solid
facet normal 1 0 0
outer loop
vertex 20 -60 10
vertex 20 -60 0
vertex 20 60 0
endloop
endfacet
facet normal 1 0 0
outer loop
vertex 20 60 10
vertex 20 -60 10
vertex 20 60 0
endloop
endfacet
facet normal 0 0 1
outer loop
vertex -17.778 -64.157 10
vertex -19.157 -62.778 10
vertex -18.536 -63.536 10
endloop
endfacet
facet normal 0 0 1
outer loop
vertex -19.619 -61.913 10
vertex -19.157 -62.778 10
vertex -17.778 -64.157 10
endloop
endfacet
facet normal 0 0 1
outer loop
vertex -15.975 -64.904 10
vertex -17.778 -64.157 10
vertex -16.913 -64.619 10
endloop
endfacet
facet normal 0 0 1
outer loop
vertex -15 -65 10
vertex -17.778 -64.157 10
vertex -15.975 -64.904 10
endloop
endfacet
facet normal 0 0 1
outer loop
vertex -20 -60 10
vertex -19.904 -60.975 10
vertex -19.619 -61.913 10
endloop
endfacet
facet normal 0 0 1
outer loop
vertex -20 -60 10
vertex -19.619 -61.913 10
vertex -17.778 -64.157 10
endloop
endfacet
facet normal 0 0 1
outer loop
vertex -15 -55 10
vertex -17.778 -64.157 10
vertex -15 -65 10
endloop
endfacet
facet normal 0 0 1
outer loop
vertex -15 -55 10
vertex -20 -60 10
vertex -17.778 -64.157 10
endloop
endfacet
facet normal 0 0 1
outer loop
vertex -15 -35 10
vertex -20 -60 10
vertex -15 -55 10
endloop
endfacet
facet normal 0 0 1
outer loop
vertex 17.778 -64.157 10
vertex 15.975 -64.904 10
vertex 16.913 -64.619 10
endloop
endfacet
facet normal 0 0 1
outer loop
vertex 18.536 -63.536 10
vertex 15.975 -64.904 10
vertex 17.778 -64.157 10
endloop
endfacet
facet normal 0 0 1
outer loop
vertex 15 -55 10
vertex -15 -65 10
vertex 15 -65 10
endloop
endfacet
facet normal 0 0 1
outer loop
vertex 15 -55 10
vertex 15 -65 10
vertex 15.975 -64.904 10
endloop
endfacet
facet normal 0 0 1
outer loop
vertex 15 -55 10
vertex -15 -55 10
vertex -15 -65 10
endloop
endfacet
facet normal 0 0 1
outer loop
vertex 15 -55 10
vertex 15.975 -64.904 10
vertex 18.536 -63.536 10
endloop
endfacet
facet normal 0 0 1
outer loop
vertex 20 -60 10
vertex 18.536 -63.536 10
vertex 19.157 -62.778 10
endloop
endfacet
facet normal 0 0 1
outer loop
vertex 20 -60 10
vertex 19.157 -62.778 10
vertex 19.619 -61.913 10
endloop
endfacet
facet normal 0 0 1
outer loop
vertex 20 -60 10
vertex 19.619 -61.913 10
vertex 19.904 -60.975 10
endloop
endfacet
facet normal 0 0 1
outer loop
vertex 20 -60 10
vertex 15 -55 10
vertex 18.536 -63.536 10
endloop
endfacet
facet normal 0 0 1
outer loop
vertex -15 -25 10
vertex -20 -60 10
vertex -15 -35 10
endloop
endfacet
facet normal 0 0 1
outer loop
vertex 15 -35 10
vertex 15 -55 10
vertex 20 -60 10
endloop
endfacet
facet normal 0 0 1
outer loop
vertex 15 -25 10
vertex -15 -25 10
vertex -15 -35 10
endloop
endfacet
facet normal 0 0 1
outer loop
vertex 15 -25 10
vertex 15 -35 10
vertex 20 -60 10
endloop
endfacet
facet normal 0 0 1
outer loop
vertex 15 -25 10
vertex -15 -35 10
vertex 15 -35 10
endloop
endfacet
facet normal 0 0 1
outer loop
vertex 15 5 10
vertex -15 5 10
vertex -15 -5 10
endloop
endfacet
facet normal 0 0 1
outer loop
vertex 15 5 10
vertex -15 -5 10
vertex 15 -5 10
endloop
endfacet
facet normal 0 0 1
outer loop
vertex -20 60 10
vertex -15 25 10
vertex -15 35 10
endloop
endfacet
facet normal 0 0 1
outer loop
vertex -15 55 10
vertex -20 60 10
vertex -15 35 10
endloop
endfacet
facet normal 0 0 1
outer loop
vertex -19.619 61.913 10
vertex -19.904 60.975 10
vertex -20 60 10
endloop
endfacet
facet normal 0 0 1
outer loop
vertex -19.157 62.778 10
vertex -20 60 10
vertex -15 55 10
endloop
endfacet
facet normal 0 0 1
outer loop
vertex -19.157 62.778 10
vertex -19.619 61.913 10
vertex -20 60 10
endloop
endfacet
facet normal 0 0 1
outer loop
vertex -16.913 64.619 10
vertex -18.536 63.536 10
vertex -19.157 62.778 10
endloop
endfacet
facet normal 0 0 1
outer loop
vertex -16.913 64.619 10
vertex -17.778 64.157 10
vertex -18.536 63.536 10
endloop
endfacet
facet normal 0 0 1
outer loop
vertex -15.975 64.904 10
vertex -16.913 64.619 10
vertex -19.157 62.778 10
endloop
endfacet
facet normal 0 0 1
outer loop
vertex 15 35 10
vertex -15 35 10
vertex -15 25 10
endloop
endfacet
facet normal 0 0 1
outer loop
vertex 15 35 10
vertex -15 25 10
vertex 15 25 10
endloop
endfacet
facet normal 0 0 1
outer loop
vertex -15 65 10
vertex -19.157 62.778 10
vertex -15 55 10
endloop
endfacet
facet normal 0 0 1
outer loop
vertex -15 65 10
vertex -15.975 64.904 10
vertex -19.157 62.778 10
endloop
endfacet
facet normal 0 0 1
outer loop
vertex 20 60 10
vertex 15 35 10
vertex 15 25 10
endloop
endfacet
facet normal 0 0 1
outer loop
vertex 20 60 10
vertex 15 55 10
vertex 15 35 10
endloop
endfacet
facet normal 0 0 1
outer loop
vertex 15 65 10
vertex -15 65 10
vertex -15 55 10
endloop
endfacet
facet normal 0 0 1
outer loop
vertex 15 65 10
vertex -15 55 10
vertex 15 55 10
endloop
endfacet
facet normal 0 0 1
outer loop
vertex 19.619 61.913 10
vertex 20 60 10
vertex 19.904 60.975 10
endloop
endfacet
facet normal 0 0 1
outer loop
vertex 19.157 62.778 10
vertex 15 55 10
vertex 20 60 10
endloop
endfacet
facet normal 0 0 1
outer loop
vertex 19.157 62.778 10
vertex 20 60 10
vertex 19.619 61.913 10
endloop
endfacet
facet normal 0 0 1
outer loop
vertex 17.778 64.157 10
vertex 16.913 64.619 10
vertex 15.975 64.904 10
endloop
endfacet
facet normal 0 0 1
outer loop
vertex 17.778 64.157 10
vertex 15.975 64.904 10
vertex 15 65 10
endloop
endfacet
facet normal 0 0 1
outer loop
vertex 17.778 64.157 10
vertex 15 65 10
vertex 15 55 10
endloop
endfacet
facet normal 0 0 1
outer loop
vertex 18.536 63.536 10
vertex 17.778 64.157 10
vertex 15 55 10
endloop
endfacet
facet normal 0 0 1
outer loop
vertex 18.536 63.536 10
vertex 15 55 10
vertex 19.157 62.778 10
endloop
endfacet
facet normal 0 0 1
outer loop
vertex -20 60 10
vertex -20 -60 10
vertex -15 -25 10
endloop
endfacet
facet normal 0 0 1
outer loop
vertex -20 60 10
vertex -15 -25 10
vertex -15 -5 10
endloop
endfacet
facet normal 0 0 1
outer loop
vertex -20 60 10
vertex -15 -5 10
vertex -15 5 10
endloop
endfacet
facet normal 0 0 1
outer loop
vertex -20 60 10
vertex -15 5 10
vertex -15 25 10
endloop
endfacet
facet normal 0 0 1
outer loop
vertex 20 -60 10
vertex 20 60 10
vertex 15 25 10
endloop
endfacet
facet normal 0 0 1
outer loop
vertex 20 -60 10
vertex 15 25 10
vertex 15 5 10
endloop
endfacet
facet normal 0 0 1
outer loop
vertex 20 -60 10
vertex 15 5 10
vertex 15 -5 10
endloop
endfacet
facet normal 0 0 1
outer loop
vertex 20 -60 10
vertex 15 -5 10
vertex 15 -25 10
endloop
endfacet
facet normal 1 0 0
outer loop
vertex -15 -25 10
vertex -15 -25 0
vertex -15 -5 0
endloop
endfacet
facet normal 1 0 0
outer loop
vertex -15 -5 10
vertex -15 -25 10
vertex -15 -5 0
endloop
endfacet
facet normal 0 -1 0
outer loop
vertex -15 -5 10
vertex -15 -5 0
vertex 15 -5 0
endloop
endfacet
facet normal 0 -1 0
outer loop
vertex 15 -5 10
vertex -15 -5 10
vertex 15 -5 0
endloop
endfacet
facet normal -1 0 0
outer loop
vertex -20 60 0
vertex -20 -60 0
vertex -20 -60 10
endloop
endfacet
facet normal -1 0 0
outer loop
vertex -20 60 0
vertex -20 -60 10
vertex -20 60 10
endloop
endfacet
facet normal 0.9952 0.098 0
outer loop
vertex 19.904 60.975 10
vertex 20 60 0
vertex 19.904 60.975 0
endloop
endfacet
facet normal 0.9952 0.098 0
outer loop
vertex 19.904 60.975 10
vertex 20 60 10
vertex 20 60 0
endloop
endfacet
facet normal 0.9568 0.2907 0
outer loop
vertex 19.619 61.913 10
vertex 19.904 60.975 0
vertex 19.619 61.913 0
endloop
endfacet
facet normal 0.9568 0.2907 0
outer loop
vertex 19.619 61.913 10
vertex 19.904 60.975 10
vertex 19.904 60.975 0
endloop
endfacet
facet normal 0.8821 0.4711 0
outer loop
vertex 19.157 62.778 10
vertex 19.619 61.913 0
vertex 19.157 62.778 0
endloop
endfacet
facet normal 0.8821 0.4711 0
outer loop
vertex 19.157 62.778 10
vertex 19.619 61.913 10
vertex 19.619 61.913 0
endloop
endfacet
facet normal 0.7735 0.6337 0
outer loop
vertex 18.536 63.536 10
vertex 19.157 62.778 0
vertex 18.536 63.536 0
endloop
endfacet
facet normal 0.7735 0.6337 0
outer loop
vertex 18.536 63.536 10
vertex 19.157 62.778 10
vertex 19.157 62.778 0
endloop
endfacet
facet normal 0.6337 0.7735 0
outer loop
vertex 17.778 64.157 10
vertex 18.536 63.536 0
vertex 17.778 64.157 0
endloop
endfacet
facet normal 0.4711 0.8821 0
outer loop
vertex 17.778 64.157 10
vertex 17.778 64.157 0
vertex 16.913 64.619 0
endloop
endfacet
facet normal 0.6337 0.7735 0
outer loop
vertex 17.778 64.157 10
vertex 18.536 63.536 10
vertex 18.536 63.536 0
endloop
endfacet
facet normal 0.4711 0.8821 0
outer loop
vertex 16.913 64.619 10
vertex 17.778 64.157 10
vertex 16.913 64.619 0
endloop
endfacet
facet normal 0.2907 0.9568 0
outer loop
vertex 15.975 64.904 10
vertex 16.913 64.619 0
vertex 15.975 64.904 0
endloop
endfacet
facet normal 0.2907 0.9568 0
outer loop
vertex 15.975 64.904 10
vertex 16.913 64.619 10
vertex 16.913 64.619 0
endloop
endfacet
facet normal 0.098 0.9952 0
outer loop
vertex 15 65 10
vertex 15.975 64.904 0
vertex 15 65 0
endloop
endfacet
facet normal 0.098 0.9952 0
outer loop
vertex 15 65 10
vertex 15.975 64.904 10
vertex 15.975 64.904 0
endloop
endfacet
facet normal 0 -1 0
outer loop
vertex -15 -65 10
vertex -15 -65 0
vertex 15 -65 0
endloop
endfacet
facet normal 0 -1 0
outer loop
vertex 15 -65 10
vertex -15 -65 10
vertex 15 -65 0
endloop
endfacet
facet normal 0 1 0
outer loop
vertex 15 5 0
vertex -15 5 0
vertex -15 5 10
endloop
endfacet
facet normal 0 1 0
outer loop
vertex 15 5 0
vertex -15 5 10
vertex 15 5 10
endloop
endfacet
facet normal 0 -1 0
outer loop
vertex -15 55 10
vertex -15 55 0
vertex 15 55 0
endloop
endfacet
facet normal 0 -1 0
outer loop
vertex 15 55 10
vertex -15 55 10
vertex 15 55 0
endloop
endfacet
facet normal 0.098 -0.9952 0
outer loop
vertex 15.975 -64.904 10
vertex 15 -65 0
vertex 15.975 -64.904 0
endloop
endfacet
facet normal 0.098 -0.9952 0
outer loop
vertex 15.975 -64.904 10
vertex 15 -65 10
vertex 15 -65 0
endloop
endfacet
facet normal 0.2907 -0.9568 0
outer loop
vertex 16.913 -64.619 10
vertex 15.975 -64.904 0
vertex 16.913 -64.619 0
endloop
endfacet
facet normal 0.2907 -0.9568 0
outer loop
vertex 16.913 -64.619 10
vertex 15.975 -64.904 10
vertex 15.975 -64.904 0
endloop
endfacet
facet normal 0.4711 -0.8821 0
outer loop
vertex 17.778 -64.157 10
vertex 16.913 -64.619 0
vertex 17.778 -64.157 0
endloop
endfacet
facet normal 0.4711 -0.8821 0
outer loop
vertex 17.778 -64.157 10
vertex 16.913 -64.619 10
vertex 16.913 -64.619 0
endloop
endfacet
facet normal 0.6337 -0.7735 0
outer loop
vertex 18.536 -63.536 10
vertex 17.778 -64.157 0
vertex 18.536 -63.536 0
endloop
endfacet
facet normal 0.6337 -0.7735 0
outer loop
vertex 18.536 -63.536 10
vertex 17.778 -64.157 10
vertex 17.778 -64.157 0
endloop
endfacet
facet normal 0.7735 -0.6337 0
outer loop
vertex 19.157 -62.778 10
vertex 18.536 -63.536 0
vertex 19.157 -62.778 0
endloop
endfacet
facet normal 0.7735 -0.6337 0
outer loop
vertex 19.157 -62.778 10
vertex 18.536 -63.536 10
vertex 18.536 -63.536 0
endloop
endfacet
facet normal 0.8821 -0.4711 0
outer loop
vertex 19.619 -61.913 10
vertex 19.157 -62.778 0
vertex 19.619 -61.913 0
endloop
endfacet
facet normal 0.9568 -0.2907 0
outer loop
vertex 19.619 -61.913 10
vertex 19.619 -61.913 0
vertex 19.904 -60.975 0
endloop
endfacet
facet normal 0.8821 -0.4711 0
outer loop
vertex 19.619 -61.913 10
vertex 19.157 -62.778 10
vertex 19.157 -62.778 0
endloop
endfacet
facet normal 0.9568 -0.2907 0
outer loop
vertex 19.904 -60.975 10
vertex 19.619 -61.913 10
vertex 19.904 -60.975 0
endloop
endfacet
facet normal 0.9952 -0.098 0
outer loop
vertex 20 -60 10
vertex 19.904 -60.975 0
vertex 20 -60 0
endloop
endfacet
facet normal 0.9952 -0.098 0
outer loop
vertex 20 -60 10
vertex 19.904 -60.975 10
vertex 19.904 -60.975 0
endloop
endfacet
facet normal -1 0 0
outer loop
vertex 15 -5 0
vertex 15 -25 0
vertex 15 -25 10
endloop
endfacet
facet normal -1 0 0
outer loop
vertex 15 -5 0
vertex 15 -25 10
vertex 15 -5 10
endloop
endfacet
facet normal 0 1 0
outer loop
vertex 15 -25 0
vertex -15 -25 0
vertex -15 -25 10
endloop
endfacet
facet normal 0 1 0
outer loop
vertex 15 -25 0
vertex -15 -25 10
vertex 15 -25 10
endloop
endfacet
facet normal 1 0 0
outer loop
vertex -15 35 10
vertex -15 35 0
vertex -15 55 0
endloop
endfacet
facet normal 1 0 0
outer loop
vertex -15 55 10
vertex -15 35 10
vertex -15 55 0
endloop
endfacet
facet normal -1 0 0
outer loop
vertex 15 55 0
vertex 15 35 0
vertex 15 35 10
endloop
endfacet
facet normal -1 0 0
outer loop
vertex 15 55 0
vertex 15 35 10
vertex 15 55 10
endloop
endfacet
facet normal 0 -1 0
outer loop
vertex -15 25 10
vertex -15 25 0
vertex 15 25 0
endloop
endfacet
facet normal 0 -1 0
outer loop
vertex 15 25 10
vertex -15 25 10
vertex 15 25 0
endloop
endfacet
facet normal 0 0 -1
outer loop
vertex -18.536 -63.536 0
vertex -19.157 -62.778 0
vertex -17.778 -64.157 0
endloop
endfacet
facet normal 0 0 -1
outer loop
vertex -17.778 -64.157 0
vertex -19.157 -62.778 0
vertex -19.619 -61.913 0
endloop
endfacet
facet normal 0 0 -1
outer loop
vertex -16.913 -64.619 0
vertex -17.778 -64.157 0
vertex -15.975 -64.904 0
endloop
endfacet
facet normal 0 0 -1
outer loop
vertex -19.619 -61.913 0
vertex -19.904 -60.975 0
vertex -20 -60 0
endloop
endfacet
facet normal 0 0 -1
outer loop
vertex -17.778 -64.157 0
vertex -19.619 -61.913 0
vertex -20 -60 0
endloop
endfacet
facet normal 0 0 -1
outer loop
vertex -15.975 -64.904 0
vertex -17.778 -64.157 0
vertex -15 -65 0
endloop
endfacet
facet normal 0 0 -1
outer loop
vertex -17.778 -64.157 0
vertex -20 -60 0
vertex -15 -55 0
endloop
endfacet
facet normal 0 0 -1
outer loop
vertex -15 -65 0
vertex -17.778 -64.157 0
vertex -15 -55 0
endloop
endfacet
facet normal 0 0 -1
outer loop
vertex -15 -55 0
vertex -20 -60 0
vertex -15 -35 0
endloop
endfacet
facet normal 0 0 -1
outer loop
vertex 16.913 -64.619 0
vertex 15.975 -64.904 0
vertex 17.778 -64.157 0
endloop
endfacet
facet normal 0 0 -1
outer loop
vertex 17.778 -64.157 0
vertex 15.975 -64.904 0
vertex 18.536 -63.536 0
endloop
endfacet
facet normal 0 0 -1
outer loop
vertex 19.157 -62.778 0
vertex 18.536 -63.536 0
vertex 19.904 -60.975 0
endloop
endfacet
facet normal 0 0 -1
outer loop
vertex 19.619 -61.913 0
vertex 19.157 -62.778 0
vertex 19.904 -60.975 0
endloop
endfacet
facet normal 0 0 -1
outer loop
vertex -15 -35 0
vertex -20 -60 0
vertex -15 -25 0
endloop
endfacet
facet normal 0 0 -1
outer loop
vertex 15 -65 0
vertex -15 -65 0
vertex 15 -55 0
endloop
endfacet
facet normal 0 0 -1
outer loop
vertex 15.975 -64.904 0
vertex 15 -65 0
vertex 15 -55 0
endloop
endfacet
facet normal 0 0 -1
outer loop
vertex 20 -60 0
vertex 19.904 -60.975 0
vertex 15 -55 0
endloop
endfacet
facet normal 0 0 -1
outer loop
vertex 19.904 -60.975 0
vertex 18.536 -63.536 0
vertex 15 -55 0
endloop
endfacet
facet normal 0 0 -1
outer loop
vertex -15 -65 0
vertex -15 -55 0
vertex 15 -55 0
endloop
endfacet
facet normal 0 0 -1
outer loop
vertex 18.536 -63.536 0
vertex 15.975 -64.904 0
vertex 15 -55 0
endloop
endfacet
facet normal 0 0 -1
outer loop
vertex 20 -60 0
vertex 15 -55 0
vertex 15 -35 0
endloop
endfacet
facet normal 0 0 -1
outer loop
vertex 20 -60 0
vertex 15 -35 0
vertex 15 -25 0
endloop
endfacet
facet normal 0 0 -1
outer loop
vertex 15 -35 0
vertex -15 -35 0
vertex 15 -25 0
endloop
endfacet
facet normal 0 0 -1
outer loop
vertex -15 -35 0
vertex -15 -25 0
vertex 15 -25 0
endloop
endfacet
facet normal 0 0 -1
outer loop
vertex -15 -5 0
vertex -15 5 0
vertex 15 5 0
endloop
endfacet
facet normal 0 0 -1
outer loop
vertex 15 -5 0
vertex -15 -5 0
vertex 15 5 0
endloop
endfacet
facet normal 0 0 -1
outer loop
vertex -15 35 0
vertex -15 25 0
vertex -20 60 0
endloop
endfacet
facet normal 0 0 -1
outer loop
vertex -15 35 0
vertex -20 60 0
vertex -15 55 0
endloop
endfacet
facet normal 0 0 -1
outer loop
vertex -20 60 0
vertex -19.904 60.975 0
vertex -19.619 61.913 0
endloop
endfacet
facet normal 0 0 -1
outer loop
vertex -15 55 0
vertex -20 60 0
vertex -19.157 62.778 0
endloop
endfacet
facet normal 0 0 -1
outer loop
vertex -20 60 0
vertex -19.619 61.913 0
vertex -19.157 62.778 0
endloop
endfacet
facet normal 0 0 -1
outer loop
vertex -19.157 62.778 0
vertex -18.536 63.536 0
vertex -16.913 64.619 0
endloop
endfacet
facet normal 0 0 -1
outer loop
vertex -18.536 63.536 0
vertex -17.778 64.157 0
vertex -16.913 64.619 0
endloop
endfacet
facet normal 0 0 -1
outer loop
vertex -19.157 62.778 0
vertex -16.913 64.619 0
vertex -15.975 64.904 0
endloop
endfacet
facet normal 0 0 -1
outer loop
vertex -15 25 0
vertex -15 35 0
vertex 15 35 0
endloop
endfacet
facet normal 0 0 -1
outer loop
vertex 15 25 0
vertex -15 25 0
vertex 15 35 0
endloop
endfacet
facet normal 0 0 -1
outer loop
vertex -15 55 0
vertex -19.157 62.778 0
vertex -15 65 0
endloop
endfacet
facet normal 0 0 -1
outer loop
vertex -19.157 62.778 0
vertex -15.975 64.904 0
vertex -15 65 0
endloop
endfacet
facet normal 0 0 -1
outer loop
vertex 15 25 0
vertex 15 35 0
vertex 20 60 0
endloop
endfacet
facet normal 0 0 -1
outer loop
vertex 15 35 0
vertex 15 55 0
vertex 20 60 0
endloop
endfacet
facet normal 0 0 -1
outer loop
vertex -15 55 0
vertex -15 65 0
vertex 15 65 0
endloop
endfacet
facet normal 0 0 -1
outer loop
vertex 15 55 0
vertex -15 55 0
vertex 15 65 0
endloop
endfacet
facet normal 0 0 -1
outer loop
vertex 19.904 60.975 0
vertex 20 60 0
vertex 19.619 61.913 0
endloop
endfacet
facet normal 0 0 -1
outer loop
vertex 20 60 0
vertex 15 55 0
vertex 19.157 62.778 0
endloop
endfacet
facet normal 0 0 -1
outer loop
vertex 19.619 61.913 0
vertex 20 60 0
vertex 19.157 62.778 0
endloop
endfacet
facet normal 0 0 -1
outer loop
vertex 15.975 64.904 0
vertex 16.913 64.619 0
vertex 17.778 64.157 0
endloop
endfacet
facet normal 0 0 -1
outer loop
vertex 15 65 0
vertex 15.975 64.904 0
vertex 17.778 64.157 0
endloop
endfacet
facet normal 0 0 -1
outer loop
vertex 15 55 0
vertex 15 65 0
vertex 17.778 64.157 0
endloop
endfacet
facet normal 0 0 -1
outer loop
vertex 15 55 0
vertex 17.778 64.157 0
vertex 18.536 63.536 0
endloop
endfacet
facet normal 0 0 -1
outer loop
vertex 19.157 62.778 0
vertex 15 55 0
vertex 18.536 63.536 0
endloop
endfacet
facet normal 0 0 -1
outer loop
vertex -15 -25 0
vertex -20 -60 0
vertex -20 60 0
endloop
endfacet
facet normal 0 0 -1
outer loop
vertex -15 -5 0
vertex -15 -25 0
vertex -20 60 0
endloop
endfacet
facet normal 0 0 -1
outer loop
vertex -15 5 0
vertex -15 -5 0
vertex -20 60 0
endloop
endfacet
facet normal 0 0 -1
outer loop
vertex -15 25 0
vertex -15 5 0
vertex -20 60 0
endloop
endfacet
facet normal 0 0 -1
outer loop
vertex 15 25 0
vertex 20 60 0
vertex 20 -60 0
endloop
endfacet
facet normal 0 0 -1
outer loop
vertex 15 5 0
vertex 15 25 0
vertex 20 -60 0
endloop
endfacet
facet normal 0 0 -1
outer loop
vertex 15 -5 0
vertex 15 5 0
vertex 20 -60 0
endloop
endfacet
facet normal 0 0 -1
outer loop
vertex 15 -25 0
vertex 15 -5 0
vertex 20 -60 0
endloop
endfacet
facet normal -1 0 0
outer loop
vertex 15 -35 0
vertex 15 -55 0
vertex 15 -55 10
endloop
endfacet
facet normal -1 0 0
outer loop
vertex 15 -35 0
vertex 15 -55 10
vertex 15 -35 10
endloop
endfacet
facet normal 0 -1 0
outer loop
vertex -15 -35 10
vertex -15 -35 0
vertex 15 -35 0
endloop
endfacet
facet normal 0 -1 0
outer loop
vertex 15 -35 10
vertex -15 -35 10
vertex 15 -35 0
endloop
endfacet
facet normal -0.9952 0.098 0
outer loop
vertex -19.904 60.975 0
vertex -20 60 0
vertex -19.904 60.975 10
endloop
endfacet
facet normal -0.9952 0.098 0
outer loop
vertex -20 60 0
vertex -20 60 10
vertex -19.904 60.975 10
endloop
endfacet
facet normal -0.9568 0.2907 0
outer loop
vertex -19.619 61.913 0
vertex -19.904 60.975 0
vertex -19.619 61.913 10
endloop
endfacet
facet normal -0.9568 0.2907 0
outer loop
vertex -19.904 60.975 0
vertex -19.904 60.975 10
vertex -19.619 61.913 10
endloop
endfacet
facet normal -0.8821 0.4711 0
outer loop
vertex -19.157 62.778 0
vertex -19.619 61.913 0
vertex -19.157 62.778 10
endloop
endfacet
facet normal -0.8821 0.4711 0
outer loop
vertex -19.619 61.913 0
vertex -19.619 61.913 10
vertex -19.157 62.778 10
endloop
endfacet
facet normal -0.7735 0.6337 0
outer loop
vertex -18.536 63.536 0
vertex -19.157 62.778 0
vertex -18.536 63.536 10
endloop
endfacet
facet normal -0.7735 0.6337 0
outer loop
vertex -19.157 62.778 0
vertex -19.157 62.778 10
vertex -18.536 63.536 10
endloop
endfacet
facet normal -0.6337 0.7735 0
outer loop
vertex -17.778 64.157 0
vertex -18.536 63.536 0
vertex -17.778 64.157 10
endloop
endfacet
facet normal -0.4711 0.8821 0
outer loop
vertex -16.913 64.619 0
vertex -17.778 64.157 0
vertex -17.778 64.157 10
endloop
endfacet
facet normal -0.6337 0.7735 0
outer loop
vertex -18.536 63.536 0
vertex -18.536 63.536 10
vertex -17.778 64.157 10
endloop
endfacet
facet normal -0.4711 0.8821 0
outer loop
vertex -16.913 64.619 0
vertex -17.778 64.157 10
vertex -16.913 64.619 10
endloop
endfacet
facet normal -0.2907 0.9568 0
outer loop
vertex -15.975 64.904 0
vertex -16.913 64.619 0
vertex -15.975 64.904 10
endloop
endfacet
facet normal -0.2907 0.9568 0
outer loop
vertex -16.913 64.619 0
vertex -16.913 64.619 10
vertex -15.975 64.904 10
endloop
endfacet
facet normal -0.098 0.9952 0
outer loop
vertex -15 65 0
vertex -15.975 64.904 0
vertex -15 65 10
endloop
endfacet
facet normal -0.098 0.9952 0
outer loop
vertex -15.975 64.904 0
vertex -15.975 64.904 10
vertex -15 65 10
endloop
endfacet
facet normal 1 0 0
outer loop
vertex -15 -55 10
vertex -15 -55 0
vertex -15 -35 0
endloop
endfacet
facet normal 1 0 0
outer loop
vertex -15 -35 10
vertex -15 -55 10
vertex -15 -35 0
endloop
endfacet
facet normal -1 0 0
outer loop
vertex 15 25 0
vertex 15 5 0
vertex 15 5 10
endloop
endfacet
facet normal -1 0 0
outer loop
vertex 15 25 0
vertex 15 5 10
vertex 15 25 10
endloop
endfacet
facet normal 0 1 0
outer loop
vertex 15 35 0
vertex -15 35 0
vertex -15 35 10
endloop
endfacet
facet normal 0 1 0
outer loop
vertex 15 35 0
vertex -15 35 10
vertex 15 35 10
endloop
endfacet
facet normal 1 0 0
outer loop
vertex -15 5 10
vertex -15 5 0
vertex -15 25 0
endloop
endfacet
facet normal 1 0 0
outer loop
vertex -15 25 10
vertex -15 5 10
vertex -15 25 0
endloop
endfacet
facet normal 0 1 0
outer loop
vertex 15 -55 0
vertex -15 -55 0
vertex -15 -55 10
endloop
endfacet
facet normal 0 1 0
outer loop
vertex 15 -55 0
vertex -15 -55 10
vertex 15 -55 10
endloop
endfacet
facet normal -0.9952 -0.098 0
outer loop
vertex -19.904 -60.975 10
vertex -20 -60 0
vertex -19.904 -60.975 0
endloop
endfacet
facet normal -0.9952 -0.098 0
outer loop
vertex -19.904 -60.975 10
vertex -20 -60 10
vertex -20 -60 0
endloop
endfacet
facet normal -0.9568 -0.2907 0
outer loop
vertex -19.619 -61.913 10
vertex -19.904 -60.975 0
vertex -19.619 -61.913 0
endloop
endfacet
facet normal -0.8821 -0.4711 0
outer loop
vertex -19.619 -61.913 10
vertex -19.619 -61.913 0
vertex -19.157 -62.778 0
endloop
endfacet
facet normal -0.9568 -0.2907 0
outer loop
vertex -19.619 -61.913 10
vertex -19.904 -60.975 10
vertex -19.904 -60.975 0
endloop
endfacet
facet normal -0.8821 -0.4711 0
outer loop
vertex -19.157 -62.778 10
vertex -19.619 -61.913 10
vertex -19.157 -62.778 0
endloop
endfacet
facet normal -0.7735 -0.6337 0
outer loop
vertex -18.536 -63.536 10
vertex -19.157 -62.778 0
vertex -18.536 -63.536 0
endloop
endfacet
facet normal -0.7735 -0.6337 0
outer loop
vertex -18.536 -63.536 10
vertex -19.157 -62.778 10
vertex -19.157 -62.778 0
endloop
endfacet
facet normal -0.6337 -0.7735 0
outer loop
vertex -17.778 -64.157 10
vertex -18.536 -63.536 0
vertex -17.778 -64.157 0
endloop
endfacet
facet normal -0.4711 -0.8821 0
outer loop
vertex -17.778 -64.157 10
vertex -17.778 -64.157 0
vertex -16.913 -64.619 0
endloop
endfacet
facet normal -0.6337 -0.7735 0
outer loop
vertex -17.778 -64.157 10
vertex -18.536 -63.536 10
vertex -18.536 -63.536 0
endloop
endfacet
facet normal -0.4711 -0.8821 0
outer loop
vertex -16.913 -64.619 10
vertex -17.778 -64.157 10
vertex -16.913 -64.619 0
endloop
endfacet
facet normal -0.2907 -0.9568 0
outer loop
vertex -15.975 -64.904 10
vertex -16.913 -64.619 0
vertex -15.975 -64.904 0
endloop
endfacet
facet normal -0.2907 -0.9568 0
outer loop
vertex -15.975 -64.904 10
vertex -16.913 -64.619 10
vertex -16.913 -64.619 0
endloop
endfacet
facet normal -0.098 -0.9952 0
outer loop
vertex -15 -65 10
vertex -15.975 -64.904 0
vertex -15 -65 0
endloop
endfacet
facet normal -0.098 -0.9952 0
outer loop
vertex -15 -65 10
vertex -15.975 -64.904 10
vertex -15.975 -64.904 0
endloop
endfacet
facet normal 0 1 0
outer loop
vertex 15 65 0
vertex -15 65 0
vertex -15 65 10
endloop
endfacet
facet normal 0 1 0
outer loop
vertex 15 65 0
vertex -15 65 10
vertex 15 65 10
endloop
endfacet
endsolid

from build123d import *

# Parameters (mm, degrees)
F0_W     = 40
F0_H     = 130
F1_DEPTH = 10
F2_R     = 5
F3_W     = 30
F3_H     = 20
F4_DEPTH = 25


with BuildPart() as f1:
    # F0 (on Top) → F1 (new body)
    with BuildSketch(Plane.XY):
        Rectangle(F0_W, F0_H)
    extrude(amount=F1_DEPTH)

    # F2
    f2_edges = [f1.edges().sort_by_distance(p)[0] for p in [
        (-20, -65, 5),
        (20, -65, 5),
        (20, 65, 5),
        (-20, 65, 5),
    ]]
    fillet(f2_edges, radius=F2_R)

    # F3 (on Top) → F4 (cut)
    with BuildSketch(Plane.XY):
        with Locations((0, 15)):
            Rectangle(F3_W, F3_H)
        with Locations((0, 45)):
            Rectangle(F3_W, F3_H)
        with Locations((0, -15)):
            Rectangle(F3_W, F3_H)
        with Locations((0, -45)):
            Rectangle(F3_W, F3_H)
    extrude(amount=F4_DEPTH, mode=Mode.SUBTRACT)


solid = f1.part
